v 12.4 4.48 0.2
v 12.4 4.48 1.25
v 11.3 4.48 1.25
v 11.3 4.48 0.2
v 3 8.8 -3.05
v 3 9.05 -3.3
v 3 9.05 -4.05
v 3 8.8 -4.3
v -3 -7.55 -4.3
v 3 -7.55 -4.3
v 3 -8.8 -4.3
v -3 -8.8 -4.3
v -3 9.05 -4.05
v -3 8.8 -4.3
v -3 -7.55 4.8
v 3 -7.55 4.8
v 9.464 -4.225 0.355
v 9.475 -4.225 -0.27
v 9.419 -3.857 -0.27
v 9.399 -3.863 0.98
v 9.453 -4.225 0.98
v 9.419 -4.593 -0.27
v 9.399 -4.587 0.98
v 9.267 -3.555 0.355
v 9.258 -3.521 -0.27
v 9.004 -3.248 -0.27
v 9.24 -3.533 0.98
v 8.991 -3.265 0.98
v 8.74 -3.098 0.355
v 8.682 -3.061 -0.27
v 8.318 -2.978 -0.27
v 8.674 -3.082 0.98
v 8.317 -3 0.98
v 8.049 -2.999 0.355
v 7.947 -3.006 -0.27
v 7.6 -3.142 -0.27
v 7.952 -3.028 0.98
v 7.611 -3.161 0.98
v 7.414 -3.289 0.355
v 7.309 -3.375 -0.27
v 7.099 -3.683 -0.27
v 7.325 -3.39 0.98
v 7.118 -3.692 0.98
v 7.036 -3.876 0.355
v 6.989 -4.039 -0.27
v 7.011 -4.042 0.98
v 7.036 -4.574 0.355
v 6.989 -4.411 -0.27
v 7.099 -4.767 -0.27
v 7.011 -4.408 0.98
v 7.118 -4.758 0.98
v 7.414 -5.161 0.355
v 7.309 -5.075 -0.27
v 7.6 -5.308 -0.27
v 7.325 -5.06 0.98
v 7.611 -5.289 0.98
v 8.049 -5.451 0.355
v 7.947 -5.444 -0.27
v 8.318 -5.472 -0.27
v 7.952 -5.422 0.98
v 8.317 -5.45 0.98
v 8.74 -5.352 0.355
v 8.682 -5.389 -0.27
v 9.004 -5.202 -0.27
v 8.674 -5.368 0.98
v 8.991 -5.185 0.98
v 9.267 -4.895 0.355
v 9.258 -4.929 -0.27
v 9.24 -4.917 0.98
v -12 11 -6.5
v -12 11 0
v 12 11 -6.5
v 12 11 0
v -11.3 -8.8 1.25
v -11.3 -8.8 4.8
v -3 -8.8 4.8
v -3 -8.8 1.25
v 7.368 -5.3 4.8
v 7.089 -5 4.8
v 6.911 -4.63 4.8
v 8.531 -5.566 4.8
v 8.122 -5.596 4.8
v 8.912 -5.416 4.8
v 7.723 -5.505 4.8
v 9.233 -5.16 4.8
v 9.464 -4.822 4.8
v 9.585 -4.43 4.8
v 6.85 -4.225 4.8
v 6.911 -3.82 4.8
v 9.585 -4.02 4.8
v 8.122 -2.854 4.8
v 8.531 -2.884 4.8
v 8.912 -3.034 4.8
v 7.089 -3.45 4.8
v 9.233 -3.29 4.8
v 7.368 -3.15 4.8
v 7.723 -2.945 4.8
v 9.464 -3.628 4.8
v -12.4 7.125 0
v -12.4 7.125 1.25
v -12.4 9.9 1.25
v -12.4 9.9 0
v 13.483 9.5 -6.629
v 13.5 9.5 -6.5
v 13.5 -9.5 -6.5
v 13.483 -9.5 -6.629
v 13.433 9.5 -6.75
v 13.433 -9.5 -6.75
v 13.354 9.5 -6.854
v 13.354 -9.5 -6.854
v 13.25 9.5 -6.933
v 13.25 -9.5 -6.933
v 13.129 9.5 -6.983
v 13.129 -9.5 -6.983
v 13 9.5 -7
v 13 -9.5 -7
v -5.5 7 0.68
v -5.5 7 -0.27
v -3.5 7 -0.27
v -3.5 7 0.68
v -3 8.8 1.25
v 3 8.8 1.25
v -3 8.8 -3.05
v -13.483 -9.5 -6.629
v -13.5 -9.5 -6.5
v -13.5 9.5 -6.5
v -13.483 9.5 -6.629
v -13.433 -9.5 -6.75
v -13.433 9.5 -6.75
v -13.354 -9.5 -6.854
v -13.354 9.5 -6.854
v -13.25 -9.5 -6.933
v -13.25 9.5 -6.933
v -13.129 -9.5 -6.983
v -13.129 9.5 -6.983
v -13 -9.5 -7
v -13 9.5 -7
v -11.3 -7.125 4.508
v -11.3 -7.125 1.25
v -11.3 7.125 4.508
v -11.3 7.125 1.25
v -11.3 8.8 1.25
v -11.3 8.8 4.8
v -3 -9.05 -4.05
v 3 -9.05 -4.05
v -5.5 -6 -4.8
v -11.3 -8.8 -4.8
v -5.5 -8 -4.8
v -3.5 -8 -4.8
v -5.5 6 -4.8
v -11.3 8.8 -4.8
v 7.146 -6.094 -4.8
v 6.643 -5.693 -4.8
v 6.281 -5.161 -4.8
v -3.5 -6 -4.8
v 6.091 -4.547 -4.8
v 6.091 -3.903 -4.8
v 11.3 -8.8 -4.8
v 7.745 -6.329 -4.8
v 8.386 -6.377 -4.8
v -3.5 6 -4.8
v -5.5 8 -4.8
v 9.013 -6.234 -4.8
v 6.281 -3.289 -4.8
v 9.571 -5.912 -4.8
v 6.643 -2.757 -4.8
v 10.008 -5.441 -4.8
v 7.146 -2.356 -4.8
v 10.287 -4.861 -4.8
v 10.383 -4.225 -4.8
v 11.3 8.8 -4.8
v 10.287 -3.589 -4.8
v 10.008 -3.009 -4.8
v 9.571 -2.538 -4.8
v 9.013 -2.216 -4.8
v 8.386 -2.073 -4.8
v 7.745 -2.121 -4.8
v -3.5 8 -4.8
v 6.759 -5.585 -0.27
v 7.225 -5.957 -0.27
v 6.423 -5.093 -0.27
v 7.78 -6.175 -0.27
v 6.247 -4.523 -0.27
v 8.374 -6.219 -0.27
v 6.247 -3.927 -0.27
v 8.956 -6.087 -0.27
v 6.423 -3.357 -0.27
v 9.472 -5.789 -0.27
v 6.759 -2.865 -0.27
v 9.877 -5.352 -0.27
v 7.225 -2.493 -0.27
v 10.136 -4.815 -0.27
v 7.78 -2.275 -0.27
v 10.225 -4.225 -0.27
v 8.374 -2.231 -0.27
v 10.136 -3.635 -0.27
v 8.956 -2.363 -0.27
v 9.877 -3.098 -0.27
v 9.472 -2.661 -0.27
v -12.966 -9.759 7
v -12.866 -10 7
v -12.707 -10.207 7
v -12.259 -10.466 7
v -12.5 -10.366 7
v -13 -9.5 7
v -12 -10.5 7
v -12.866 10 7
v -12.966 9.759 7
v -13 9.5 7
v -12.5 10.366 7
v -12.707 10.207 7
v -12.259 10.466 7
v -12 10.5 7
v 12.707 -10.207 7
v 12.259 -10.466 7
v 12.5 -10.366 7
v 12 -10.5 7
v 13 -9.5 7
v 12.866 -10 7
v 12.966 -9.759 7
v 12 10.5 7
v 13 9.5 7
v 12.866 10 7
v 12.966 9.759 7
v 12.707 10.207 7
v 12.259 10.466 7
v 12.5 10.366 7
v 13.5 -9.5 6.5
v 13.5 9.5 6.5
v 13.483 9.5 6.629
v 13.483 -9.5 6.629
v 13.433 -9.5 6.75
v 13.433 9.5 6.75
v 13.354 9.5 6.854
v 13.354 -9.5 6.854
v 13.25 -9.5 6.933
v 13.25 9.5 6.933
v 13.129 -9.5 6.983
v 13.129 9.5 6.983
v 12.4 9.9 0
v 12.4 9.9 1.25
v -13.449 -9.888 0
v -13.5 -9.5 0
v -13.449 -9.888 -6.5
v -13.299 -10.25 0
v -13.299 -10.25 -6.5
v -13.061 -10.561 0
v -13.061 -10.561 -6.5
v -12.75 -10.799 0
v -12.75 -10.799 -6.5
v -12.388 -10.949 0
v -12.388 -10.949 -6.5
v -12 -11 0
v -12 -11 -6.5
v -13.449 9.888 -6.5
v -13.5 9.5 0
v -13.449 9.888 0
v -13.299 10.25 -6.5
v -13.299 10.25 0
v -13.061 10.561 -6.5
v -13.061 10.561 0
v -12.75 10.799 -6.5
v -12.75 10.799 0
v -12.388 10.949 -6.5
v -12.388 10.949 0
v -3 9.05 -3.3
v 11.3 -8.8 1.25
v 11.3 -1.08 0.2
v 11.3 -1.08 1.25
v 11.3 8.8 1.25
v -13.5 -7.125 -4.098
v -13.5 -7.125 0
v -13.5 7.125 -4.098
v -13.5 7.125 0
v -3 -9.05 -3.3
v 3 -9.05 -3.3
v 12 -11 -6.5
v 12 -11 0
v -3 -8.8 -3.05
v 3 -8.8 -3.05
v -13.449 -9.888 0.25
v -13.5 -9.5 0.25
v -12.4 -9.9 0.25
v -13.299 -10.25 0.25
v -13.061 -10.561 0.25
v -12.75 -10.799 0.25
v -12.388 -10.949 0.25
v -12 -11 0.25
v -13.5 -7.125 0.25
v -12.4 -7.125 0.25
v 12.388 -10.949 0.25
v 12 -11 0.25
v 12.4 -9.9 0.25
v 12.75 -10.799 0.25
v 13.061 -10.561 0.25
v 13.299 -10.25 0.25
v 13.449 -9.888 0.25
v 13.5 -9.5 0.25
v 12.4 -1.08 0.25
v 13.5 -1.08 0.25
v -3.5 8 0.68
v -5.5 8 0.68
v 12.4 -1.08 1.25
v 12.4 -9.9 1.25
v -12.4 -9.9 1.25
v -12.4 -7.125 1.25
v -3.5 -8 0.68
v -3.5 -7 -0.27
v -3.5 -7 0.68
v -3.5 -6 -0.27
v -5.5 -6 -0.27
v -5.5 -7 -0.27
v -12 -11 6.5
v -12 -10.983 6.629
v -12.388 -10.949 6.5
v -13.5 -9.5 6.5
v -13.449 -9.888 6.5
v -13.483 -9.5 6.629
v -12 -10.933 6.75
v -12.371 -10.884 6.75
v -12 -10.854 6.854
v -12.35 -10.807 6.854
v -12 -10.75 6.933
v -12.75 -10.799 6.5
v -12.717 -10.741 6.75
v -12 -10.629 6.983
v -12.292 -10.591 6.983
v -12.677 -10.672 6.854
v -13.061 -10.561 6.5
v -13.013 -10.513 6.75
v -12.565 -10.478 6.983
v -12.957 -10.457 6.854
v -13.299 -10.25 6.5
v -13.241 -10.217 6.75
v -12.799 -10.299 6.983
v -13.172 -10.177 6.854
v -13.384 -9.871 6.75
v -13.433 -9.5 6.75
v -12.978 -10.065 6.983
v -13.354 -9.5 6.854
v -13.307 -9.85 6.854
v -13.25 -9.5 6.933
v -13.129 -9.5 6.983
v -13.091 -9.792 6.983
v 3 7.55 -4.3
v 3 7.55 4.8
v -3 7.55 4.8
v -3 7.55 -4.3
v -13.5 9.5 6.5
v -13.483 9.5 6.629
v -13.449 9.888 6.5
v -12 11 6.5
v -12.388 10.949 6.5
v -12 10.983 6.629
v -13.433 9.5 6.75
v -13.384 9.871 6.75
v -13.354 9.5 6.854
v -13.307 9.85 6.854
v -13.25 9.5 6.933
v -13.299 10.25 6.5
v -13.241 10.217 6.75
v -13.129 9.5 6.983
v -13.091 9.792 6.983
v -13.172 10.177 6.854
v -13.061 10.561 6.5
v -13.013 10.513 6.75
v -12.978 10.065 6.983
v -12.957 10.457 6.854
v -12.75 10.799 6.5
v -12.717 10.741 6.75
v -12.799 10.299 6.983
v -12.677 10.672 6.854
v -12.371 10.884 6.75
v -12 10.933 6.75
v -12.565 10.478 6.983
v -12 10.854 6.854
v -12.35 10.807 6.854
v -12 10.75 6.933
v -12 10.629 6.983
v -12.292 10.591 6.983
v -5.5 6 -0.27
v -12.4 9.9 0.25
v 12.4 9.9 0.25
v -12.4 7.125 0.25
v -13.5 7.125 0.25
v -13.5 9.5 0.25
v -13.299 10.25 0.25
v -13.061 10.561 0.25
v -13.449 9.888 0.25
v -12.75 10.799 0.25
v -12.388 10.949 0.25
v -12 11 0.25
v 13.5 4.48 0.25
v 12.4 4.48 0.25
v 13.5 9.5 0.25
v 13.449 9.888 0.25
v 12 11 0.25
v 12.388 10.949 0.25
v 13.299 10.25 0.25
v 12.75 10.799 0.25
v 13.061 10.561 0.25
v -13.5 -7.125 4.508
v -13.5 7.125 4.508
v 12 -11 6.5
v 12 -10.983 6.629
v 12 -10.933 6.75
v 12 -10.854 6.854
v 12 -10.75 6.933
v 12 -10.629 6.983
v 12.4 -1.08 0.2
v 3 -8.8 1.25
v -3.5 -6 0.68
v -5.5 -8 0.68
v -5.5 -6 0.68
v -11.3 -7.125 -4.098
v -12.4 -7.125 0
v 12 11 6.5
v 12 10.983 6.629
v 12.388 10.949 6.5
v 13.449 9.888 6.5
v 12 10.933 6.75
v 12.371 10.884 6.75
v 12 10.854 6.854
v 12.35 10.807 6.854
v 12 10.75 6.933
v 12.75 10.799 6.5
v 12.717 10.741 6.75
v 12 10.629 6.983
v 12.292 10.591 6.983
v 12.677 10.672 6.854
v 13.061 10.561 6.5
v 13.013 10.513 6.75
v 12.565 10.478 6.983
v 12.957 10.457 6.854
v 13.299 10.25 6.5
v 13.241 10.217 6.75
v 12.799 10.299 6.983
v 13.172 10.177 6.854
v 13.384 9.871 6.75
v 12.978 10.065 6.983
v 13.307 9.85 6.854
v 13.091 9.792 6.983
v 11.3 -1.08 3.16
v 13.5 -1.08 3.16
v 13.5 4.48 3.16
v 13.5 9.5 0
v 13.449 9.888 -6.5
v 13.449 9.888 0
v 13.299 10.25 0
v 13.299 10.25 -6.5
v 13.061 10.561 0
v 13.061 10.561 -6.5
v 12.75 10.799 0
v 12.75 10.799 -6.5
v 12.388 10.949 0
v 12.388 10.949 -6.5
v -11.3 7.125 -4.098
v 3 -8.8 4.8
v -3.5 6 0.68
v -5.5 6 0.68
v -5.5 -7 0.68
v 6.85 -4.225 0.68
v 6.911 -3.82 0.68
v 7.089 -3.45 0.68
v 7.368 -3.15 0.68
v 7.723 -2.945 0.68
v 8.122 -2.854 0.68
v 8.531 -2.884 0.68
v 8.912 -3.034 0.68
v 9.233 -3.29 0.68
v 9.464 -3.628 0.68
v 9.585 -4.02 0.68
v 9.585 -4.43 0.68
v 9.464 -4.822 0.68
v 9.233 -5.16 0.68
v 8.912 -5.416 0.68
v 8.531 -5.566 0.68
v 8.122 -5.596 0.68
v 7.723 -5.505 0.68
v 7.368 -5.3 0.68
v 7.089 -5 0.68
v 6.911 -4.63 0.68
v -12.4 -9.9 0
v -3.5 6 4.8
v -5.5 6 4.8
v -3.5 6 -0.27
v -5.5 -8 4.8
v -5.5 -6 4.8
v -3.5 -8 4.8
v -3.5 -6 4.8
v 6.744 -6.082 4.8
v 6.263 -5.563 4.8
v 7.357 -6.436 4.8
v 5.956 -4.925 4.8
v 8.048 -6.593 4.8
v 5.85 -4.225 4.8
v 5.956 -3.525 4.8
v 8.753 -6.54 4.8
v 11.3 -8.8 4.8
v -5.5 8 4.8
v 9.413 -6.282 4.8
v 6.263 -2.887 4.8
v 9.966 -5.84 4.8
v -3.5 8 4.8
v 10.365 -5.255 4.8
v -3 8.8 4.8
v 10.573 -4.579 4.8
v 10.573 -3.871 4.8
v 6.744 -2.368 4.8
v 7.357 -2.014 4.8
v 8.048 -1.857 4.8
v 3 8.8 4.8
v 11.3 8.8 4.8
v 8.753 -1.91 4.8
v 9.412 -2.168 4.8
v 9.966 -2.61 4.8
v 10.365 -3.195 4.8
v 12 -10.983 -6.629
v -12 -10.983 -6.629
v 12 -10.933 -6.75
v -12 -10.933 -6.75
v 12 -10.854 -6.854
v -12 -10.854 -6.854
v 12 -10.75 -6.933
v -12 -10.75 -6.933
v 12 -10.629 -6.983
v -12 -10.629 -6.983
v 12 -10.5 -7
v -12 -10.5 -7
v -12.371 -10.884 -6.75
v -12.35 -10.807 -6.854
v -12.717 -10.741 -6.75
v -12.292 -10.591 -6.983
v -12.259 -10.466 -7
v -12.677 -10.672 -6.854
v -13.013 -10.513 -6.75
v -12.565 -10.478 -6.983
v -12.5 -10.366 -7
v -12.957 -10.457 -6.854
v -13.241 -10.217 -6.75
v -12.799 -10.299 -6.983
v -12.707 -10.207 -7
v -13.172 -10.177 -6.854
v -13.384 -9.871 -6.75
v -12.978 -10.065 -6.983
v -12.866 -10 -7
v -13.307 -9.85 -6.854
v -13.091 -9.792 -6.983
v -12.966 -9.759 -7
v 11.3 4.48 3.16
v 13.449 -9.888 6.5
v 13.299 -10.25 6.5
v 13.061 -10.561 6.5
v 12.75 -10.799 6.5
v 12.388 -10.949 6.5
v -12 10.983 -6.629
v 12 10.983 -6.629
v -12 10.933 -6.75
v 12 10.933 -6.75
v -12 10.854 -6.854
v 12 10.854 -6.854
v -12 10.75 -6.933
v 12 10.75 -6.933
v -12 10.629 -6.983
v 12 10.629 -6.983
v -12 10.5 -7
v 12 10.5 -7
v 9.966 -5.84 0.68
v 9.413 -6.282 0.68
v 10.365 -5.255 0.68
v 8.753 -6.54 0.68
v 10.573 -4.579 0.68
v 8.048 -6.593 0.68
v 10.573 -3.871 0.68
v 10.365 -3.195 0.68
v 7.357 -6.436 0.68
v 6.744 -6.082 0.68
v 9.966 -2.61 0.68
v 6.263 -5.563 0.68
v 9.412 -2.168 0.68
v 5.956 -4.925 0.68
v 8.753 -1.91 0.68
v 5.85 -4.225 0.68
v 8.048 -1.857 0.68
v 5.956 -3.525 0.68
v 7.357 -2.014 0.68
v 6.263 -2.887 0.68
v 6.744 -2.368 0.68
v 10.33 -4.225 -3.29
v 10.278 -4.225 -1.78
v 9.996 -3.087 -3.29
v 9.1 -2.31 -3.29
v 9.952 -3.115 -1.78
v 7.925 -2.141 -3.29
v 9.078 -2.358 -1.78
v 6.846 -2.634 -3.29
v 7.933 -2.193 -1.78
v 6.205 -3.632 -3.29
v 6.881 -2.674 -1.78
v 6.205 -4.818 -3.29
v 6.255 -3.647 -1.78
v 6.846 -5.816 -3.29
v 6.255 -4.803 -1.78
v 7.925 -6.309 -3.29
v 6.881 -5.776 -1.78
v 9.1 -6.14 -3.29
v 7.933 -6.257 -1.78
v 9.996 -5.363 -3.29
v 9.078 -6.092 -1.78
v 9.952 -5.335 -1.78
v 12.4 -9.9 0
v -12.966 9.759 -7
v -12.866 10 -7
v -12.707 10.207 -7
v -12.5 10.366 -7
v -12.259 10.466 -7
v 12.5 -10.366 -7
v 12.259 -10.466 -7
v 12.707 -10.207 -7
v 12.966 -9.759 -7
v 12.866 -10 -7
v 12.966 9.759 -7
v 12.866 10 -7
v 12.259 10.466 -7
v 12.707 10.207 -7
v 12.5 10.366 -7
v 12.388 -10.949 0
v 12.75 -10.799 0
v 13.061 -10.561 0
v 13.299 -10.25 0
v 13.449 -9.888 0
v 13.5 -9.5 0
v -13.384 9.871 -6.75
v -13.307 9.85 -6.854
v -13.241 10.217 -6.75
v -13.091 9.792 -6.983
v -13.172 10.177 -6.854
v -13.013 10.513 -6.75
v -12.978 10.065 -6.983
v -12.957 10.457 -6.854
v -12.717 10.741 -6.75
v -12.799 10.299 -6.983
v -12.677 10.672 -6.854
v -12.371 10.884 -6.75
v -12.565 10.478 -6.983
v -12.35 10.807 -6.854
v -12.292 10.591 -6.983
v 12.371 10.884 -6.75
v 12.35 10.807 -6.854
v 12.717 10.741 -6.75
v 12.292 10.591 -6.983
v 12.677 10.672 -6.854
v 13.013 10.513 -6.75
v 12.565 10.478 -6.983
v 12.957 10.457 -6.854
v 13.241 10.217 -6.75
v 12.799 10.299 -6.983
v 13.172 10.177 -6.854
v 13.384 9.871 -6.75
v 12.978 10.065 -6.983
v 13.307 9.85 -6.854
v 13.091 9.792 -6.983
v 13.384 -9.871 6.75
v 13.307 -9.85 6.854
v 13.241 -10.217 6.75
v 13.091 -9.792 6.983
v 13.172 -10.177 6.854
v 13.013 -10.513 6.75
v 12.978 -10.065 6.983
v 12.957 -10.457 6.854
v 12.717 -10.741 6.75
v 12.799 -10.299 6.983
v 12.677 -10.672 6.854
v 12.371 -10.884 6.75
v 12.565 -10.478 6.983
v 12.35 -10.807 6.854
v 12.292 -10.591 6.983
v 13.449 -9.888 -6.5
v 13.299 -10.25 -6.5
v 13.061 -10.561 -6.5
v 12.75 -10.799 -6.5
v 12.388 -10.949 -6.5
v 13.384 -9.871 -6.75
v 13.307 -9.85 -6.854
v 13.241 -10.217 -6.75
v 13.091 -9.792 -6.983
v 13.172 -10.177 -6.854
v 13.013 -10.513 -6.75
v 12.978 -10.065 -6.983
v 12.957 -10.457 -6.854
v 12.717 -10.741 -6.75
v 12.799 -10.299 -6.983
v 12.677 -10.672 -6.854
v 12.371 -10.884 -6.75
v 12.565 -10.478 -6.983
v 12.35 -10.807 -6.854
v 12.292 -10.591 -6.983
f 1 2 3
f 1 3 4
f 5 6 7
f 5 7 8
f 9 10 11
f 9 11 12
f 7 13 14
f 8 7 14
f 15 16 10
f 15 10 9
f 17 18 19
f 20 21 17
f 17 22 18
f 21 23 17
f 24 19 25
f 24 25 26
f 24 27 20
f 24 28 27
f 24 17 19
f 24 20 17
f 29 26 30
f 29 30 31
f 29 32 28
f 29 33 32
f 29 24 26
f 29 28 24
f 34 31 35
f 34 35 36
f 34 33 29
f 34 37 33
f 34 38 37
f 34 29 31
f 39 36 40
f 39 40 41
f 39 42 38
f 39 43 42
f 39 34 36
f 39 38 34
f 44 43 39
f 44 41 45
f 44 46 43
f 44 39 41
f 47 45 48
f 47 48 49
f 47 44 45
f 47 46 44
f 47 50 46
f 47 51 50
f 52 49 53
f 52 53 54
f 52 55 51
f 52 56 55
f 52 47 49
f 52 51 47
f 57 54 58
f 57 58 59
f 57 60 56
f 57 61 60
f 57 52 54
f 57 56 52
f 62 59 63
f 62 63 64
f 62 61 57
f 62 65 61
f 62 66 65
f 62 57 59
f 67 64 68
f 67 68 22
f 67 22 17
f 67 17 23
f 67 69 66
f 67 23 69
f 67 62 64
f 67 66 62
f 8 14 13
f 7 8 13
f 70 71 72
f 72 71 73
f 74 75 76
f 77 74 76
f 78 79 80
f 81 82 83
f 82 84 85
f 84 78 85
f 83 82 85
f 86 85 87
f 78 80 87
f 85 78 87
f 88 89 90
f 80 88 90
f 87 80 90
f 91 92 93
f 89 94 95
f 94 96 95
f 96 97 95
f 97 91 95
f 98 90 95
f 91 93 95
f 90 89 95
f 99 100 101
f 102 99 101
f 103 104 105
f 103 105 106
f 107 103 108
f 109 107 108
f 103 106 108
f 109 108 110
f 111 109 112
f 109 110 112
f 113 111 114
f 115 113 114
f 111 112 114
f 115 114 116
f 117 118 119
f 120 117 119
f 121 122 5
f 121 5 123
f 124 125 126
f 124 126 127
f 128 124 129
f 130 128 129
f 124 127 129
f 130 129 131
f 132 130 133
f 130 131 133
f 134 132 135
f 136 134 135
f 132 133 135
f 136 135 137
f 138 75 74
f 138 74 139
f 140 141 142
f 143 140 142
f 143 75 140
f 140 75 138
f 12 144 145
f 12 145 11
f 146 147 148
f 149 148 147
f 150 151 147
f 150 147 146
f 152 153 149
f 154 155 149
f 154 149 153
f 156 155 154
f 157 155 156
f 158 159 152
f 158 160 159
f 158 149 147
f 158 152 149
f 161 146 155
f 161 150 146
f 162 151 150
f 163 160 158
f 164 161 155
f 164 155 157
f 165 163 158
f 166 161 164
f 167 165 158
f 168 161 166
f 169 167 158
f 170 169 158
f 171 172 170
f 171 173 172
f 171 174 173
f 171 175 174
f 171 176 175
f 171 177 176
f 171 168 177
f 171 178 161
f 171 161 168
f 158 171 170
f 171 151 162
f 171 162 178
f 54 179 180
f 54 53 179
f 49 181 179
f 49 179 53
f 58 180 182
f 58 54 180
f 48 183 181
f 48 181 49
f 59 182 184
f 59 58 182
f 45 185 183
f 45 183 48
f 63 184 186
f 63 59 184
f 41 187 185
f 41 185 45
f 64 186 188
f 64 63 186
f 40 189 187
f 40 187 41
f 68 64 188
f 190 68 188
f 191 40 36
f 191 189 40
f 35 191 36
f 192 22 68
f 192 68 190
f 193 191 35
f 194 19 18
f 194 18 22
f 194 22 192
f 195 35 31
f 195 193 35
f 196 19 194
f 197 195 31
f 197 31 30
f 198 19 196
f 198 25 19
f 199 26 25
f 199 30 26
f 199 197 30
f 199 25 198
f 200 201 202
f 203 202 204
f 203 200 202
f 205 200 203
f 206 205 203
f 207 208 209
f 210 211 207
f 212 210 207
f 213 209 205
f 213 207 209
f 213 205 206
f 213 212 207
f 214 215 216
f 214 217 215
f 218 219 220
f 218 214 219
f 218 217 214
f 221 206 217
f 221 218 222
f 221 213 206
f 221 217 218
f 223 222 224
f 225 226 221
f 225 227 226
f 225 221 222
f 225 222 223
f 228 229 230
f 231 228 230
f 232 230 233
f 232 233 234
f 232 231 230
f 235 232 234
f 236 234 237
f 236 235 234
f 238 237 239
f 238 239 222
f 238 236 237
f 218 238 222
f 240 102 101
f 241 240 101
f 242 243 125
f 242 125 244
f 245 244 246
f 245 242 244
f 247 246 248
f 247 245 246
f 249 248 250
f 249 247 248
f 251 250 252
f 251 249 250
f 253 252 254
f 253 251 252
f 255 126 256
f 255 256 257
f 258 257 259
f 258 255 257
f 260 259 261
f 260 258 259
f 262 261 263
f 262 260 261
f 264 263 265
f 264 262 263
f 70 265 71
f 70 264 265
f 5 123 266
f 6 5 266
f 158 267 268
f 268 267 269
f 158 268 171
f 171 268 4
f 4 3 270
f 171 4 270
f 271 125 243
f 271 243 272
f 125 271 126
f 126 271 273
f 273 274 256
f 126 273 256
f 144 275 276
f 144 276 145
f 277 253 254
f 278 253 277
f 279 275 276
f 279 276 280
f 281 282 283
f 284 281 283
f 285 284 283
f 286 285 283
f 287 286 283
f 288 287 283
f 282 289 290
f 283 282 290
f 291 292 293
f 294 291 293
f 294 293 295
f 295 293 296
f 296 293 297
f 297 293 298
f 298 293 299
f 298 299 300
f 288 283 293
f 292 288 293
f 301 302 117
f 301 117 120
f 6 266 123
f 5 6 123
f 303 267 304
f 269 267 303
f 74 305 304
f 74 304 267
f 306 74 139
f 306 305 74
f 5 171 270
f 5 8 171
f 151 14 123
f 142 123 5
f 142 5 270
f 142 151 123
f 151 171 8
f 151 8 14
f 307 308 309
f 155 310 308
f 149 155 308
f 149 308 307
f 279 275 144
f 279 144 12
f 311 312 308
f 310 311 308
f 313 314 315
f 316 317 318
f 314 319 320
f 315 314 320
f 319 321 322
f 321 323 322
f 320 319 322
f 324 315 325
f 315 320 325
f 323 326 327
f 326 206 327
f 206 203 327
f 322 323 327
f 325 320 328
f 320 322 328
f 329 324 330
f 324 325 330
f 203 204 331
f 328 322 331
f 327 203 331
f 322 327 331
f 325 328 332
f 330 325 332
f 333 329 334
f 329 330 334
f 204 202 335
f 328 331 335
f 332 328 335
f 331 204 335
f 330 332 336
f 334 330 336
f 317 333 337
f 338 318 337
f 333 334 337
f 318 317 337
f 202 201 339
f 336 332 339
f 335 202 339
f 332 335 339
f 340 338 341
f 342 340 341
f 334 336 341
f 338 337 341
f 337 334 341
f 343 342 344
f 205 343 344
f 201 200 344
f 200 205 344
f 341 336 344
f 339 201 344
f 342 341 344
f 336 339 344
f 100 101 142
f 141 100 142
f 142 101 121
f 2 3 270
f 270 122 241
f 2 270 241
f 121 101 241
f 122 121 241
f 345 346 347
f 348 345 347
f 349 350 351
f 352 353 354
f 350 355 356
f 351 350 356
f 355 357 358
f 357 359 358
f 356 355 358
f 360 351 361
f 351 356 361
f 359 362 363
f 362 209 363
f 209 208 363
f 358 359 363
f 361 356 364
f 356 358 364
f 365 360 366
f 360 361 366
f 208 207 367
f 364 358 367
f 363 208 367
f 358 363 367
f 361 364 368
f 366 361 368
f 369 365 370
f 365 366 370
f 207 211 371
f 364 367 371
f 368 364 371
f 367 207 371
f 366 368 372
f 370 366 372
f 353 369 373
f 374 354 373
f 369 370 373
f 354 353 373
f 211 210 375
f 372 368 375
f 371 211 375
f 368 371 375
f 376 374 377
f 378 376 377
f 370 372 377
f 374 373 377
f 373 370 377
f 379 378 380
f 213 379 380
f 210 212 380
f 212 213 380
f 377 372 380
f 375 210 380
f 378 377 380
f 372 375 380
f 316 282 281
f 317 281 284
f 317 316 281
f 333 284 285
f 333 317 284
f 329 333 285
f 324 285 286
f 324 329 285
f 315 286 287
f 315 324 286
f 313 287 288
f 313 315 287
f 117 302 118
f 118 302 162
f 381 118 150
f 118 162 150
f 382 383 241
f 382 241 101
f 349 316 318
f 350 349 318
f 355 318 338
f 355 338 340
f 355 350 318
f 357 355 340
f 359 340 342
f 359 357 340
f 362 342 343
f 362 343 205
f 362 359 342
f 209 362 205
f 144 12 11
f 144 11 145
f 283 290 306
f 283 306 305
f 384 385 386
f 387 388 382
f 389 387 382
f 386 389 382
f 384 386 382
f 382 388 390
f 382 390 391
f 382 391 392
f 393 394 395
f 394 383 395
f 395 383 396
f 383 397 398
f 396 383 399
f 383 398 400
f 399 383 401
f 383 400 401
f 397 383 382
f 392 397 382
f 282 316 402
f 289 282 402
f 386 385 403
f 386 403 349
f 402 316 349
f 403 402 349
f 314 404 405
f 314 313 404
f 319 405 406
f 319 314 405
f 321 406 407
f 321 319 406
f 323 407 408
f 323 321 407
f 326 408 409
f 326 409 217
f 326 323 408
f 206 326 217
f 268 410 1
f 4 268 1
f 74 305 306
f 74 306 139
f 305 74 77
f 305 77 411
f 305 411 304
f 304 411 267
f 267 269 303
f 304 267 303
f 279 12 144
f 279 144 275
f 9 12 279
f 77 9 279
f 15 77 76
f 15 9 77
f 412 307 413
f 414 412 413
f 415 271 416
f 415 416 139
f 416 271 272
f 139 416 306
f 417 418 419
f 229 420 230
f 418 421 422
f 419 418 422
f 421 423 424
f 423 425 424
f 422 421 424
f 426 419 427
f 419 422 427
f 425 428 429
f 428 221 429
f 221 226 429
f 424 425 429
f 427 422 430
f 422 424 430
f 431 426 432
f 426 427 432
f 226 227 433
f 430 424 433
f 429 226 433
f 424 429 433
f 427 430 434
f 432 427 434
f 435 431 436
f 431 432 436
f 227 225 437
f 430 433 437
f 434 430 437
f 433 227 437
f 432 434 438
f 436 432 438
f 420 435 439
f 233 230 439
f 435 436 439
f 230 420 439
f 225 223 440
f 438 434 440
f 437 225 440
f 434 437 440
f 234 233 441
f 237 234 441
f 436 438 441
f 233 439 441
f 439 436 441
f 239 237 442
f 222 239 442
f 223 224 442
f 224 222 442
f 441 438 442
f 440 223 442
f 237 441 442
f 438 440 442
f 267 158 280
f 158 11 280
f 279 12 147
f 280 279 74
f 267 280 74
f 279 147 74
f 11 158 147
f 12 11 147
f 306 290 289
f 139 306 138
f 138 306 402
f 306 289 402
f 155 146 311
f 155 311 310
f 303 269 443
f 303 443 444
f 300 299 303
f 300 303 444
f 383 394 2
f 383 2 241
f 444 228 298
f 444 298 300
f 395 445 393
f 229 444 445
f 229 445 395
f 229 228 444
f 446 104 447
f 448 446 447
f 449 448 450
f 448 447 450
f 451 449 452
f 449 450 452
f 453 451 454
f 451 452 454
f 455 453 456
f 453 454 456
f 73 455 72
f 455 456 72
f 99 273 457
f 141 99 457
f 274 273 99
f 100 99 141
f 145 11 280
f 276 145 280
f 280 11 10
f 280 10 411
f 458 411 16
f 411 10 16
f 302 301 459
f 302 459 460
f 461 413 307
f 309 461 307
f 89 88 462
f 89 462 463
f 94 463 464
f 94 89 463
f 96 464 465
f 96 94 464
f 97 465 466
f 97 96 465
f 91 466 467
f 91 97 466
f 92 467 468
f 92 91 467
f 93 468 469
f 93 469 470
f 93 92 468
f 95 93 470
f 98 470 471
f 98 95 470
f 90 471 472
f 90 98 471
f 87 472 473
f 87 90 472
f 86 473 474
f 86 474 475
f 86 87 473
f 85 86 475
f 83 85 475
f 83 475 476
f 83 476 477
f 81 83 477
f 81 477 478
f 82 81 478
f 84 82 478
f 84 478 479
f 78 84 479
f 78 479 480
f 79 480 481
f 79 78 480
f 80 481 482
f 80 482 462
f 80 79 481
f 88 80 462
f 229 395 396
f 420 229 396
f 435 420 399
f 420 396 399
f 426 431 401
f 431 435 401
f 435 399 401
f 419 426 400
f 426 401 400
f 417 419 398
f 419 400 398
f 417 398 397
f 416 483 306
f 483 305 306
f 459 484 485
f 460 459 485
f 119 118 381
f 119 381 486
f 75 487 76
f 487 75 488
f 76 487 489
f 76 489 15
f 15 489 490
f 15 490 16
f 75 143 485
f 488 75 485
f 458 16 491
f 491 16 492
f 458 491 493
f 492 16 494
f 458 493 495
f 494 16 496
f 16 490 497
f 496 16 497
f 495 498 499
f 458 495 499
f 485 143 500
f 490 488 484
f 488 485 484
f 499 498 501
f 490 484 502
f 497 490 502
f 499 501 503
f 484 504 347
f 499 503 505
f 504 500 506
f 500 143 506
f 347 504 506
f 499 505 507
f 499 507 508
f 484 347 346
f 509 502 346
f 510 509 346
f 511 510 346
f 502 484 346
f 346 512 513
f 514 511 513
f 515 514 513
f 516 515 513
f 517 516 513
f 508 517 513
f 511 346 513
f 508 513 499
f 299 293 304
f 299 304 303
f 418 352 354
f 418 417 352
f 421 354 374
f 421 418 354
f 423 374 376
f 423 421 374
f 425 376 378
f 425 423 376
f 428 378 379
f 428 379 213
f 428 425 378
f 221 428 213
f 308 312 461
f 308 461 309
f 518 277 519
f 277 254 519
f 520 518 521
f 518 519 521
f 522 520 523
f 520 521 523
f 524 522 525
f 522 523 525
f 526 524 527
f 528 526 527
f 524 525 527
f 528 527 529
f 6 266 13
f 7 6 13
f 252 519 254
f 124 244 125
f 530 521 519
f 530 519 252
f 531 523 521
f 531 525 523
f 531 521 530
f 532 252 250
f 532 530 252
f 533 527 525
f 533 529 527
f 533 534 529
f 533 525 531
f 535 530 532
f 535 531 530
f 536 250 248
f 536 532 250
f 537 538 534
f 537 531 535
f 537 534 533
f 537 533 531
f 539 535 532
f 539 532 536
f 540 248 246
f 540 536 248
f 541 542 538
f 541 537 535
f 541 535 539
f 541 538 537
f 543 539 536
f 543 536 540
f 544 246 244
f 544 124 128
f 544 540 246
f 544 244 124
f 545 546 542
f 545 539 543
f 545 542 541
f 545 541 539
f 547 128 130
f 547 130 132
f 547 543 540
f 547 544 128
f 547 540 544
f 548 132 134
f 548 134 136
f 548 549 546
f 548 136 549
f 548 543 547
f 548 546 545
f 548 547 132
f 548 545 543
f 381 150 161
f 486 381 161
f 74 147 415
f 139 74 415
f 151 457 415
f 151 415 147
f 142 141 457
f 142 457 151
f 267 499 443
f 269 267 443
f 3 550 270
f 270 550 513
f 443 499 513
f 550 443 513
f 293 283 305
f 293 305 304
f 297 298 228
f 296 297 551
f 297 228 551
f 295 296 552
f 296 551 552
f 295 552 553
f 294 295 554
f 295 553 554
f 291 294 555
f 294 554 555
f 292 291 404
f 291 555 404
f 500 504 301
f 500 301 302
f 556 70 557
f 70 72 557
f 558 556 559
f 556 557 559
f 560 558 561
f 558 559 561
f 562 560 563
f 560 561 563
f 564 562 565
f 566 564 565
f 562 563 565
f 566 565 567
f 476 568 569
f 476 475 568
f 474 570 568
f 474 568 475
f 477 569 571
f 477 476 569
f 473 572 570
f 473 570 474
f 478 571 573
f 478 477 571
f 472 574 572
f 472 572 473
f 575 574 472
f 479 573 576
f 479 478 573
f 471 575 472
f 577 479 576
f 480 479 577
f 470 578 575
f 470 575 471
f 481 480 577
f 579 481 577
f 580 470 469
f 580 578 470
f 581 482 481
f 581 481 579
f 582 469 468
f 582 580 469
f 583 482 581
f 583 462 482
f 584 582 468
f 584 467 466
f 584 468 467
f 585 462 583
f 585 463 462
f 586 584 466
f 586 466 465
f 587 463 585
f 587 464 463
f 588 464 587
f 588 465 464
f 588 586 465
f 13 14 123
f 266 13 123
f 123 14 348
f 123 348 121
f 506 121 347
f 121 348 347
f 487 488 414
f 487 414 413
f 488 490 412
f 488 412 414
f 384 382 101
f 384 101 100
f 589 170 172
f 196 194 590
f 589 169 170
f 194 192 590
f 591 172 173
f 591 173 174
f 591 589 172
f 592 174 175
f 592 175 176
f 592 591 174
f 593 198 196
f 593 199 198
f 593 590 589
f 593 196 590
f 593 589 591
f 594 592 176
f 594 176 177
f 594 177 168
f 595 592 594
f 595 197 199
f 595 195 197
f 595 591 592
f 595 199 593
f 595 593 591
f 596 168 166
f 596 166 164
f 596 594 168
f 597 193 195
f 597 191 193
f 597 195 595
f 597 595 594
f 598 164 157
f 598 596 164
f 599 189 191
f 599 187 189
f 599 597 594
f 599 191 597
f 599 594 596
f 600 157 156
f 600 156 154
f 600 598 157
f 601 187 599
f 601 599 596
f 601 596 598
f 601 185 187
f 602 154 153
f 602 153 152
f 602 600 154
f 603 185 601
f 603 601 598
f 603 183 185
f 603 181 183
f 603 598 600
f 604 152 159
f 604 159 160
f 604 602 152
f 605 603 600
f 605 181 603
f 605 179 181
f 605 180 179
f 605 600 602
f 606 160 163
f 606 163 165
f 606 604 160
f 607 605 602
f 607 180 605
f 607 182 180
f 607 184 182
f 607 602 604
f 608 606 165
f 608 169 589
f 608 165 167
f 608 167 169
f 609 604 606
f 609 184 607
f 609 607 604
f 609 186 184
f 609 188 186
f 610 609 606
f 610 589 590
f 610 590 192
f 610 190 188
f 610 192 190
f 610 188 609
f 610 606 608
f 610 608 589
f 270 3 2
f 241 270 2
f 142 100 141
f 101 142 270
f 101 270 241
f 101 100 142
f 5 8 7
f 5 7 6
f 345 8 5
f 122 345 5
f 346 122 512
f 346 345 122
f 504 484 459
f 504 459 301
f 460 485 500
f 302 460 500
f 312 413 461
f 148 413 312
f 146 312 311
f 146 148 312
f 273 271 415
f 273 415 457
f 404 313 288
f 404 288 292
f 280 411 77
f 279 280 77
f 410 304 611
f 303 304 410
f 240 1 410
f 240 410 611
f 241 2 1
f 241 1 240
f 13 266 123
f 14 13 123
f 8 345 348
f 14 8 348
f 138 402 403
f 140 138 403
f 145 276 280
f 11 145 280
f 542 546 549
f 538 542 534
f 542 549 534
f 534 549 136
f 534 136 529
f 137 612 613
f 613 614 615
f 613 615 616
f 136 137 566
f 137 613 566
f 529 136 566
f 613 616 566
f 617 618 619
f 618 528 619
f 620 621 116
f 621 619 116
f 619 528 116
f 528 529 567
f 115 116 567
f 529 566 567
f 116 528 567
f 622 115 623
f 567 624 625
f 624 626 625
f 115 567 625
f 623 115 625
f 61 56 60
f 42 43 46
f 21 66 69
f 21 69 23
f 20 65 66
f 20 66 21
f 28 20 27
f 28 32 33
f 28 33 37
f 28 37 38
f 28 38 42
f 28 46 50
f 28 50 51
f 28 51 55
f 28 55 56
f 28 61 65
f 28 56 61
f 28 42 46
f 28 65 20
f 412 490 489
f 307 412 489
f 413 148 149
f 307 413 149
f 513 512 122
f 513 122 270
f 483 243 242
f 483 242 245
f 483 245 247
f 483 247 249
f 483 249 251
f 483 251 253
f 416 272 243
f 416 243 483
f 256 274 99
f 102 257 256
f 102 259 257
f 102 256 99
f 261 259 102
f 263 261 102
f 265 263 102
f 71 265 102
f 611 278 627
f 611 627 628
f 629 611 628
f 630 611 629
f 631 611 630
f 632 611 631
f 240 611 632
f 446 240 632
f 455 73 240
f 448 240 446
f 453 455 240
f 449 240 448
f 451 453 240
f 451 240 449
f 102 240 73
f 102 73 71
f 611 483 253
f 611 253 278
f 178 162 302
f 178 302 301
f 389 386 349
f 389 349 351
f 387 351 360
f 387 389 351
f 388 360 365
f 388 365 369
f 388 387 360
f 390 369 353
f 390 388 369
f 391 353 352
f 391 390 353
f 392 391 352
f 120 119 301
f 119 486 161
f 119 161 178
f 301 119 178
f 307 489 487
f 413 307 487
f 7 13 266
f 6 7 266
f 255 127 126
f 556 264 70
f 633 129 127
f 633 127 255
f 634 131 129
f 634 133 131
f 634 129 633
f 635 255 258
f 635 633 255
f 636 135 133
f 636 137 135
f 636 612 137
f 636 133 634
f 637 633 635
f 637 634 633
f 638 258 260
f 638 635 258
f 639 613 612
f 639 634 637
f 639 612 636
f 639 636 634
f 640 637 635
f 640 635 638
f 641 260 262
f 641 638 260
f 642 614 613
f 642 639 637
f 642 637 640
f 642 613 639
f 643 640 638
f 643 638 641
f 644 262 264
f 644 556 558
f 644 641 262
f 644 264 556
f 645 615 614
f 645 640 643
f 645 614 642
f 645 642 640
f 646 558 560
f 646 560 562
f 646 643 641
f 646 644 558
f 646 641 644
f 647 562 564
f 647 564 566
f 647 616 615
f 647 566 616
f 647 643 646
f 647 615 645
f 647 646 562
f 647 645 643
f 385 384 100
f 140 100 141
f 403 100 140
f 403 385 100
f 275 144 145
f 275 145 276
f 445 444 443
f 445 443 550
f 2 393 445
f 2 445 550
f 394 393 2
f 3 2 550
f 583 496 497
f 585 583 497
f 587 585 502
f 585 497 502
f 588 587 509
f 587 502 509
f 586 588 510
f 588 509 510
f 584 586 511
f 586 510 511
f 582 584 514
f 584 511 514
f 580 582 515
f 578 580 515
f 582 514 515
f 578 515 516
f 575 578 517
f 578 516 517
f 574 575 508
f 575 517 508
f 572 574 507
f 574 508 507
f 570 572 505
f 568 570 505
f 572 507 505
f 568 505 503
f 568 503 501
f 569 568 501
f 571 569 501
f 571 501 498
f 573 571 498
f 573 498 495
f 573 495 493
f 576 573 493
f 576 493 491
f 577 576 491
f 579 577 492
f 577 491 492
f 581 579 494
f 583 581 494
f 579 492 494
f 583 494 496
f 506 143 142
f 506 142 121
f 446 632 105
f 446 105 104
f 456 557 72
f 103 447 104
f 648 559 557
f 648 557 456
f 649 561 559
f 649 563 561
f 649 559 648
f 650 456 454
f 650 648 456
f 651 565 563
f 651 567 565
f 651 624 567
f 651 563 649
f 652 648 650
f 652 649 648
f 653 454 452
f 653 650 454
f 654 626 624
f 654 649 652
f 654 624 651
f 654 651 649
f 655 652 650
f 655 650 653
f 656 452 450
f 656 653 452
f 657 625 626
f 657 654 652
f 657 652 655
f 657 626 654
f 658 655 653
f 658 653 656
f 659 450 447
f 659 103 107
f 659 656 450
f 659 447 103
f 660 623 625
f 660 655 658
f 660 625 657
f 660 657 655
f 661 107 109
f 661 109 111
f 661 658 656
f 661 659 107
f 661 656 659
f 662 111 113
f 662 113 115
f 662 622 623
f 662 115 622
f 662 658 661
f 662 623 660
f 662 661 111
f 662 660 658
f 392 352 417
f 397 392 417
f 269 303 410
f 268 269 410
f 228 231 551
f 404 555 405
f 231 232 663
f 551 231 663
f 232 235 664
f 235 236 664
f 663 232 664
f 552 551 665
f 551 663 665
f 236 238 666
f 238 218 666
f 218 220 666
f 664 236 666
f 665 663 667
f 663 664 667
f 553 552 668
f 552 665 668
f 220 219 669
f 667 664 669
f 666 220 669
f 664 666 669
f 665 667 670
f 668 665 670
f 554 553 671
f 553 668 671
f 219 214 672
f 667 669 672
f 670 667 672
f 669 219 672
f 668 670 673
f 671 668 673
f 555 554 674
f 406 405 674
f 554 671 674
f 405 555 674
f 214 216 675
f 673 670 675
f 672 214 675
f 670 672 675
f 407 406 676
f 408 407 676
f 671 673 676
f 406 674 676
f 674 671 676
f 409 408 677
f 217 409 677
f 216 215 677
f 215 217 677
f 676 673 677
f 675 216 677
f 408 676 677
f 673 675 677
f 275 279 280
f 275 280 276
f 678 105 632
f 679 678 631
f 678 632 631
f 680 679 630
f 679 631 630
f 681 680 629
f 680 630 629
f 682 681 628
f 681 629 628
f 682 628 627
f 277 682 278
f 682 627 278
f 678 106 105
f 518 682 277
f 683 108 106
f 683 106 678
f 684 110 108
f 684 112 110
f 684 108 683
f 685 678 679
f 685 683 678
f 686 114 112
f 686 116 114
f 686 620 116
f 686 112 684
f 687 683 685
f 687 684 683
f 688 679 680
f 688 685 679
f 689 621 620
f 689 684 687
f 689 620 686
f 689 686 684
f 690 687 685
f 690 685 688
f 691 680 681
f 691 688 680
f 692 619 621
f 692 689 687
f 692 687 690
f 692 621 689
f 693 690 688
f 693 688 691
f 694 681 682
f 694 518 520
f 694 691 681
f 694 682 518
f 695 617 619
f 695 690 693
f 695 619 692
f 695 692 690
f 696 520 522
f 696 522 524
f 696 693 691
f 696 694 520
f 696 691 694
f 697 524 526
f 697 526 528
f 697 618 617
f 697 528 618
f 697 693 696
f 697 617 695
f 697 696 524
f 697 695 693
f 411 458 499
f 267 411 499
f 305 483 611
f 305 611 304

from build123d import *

# Parameters (mm, degrees)
SKETCH1_W                   = 27
SKETCH1_H                   = 22
BOSS_EXTRUDE1_DEPTH         = 7
FILLET1_R                   = 1.5
SHELL1_T                    = 2.2
SKETCH4_W                   = 8.606
SKETCH4_H                   = 14.25
CUT_EXTRUDE1_DEPTH          = 10
SKETCH3_W                   = 2.96
SKETCH3_H                   = 5.56
CUT_EXTRUDE2_DEPTH          = 10
FILLET2_R                   = 0.5
FILLET3_R                   = 0.5
SKETCH5_W                   = 2
SKETCH5_H                   = 1
BOSS_EXTRUDE2_DEPTH         = 4.53
SKETCH5_3_W                 = 2
SKETCH5_3_H                 = 1
BOSS_EXTRUDE3_DEPTH         = 5.48
SKETCH6_W                   = 2
SKETCH6_H                   = 2
BOSS_EXTRUDE4_DEPTH         = 4.12
LIP_GROOVE2_GROOVE_DEPTH    = 1.25
LIP_GROOVE2_GROOVE_2_DEPTH  = 0.25
LIP_GROOVE2_LIP_START       = -12.4
LIP_GROOVE2_LIP_OUTLINE_W   = 1.1
LIP_GROOVE2_LIP_OUTLINE_H   = 1.25
LIP_GROOVE2_LIP_DEPTH       = 24.8
LIP_GROOVE2_LIP_START_2     = 11.3
LIP_GROOVE2_LIP_2_OUTLINE_W = 17.6
LIP_GROOVE2_LIP_2_OUTLINE_H = 1.25
LIP_GROOVE2_LIP_2_DEPTH     = 1.1
LIP_GROOVE2_LIP_3_OUTLINE_W = 1.675
LIP_GROOVE2_LIP_3_OUTLINE_H = 1.25
LIP_GROOVE2_LIP_3_DEPTH     = 1.1
SKETCH11_W                  = 6
SKETCH11_H                  = 1.25
BOSS_EXTRUDE5_DEPTH         = 9.1
BOSS_EXTRUDE6_DEPTH         = 6
CUT_EXTRUDE3_START          = -3
CUT_EXTRUDE3_DEPTH          = 6
SKETCH3_3_W                 = 2.96
SKETCH3_3_H                 = 5.56
CUT_EXTRUDE4_DEPTH          = 10
SKETCH14_R                  = 2.375
SKETCH14_R_2                = 1.375
BOSS_EXTRUDE7_DEPTH         = 4.12


# Read off the part's stored shape, not the designer's step: Mounting Boss1, Lip&Groove2-Groove, Lip&Groove2-Lip, Cut-Extrude3
with BuildPart() as part:
    # Sketch1 → Boss-Extrude1 (new, symmetric)
    with BuildSketch(Plane.XY):
        Rectangle(SKETCH1_W, SKETCH1_H)
    extrude(amount=BOSS_EXTRUDE1_DEPTH, both=True)

    # Fillet1
    fillet1_edges = [part.edges().sort_by_distance(p)[0] for p in [
        (-13.5, 11, 0),
        (13.5, 11, 0),
        (13.5, -11, 0),
        (-13.5, -11, 0),
    ]]
    fillet(fillet1_edges, radius=FILLET1_R)

    # Shell1 (no face opened: a closed hollow body)
    add(offset(amount=-SHELL1_T, mode=Mode.PRIVATE), mode=Mode.SUBTRACT)


with BuildPart() as body_2:
    # Split1: the piece on the far side of the plane
    add(part.part)
    split(bisect_by=Plane.XY, keep=Keep.BOTTOM)

    # Mounting Boss1 outline → Mounting Boss1 (revolve)
    with BuildSketch(Plane(origin=(8.225, -4.225, 0), x_dir=(1, 0, 0), z_dir=(0, -1, 0))):
        Polygon((2, -0.27), (1.25, -0.27), (1.228181169, 0.98), (0, 0.98), (0, -4.8), (2.158191086, -4.8), align=None)
    revolve(axis=Axis((8.225, -4.225, 0), (0, 0, 1)))


with BuildPart() as part_1:
    add(part.part)

    # Split1
    split(bisect_by=Plane.XY, keep=Keep.TOP)


with BuildPart() as cut_extrude1_tool:
    # Sketch4 → Cut-Extrude1 (new body)
    with BuildSketch(Plane.ZY.offset(13.5)):
        with Locations((0.205, 0)):
            Rectangle(SKETCH4_W, SKETCH4_H)
    extrude(amount=-CUT_EXTRUDE1_DEPTH)


with BuildPart() as part_2:
    add(part_1.part)

    # Cut-Extrude1: cut by cut_extrude1_tool
    add(cut_extrude1_tool.part, mode=Mode.SUBTRACT)

    # Sketch3 → Cut-Extrude2 (cut)
    with BuildSketch(Plane(origin=(13.5, 0, 0), x_dir=(0, 0, -1), z_dir=(1, 0, 0))):
        with Locations((-1.68, 1.7)):
            Rectangle(SKETCH3_W, SKETCH3_H)
    extrude(amount=-CUT_EXTRUDE2_DEPTH, mode=Mode.SUBTRACT)

    # Fillet2
    fillet2_edges = [part_2.edges().sort_by_distance(p)[0] for p in [
        (-13.5, 0, 7),
        (0, 11, 7),
        (0, -11, 7),
        (13.5, 0, 7),
        (-13.060660172, -10.560660172, 7),
        (13.060660172, -10.560660172, 7),
        (13.060660172, 10.560660172, 7),
        (-13.060660172, 10.560660172, 7),
    ]]
    fillet(fillet2_edges, radius=FILLET2_R)

    # Sketch6 → Boss-Extrude4 (add)
    with BuildSketch(Plane(origin=(0, 0, 4.8), x_dir=(-1, 0, 0), z_dir=(0, 0, -1))):
        with Locations((4.5, 7)):
            Rectangle(SKETCH6_W, SKETCH6_H)
    boss_extrude4 = extrude(amount=BOSS_EXTRUDE4_DEPTH)

    # Mirror3: Boss-Extrude4 across plane
    add(boss_extrude4.mirror(Plane.ZX))

    # Lip&Groove2-Groove outline → Lip&Groove2-Groove (cut)
    with BuildSketch(Plane.XY):
        Polygon((-12.4, -9.9), (12.4, -9.9), (12.4, -1.08), (13.5, -1.08), (13.5, 4.48), (12.4, 4.48), (12.4, 9.9), (-12.4, 9.9), (-12.4, 7.125), (-11.3, 7.125), (-11.3, 8.8), (11.3, 8.8), (11.3, -8.8), (-11.3, -8.8), (-11.3, -7.125), (-12.4, -7.125), align=None)
    extrude(amount=LIP_GROOVE2_GROOVE_DEPTH, mode=Mode.SUBTRACT)

    # Lip_Groove2-Groove 2 outline → Lip_Groove2-Groove 2 (cut)
    with BuildSketch(Plane.XY):
        with BuildLine():
            Line((12.4, -1.08), (12.4, -9.9))
            Line((12.4, -9.9), (-12.4, -9.9))
            Line((-12.4, -9.9), (-12.4, -7.125))
            Line((-12.4, -7.125), (-13.5, -7.125))
            Line((-13.5, -7.125), (-13.5, -9.5))
            ThreePointArc((-13.5, -9.5), (-13.060660172, -10.560660172), (-12, -11))
            Line((-12, -11), (12, -11))
            ThreePointArc((12, -11), (13.060660172, -10.560660172), (13.5, -9.5))
            Line((13.5, -9.5), (13.5, -1.08))
            Line((13.5, -1.08), (12.4, -1.08))
        make_face()
        with BuildLine():
            Line((12.4, 4.48), (13.5, 4.48))
            Line((13.5, 4.48), (13.5, 9.5))
            ThreePointArc((13.5, 9.5), (13.060660172, 10.560660172), (12, 11))
            Line((12, 11), (-12, 11))
            ThreePointArc((-12, 11), (-13.060660172, 10.560660172), (-13.5, 9.5))
            Line((-13.5, 9.5), (-13.5, 7.125))
            Line((-13.5, 7.125), (-12.4, 7.125))
            Line((-12.4, 7.125), (-12.4, 9.9))
            Line((-12.4, 9.9), (12.4, 9.9))
            Line((12.4, 9.9), (12.4, 4.48))
        make_face()
    extrude(amount=LIP_GROOVE2_GROOVE_2_DEPTH, mode=Mode.SUBTRACT)

    # Sketch11 → Boss-Extrude5 (add)
    with BuildSketch(Plane(origin=(0, 0, 4.8), x_dir=(-1, 0, 0), z_dir=(0, 0, -1))):
        with Locations((0, -8.175)):
            Rectangle(SKETCH11_W, SKETCH11_H)
    boss_extrude5 = extrude(amount=BOSS_EXTRUDE5_DEPTH)

    # Sketch12 → Boss-Extrude6 (add)
    with BuildSketch(Plane.ZY.offset(3)):
        Polygon((-4.3, -8.8), (-4.05, -9.05), (-3.3, -9.05), (-3.05, -8.8), align=None)
    boss_extrude6 = extrude(amount=-BOSS_EXTRUDE6_DEPTH)

    # Mirror5: Boss-Extrude5, Boss-Extrude6 across plane
    add(boss_extrude5.mirror(Plane.ZX))
    add(boss_extrude6.mirror(Plane.ZX))

    # Sketch14 → Boss-Extrude7 (add)
    with BuildSketch(Plane(origin=(0, 0, 4.8), x_dir=(-1, 0, 0), z_dir=(0, 0, -1))):
        with Locations((-8.225, -4.225)):
            Circle(SKETCH14_R)
        with Locations((-8.225, -4.225)):
            Circle(SKETCH14_R_2, mode=Mode.SUBTRACT)
    extrude(amount=BOSS_EXTRUDE7_DEPTH)


with BuildPart() as body_2_1:
    add(body_2.part)

    # Cut-Extrude1: cut by cut_extrude1_tool
    add(cut_extrude1_tool.part, mode=Mode.SUBTRACT)

    # Fillet3
    fillet3_edges = [body_2_1.edges().sort_by_distance(p)[0] for p in [
        (-13.5, 0, -7),
        (0, -11, -7),
        (13.5, 0, -7),
        (0, 11, -7),
        (-13.060660172, -10.560660172, -7),
        (13.060660172, -10.560660172, -7),
        (13.060660172, 10.560660172, -7),
        (-13.060660172, 10.560660172, -7),
    ]]
    fillet(fillet3_edges, radius=FILLET3_R)

    # Sketch5 → Boss-Extrude2 (add)
    with BuildSketch(Plane.XY.offset(-4.8)):
        with Locations((-4.5, 7.5)):
            Rectangle(SKETCH5_W, SKETCH5_H)
        with Locations((-4.5, 6.5)):
            Rectangle(SKETCH5_W, SKETCH5_H)
    boss_extrude2 = extrude(amount=BOSS_EXTRUDE2_DEPTH)

    # Sketch5<3> → Boss-Extrude3 (add)
    with BuildSketch(Plane.XY.offset(-4.8)):
        with Locations((-4.5, 7.5)):
            Rectangle(SKETCH5_3_W, SKETCH5_3_H)
    boss_extrude3 = extrude(amount=BOSS_EXTRUDE3_DEPTH)

    # Mirror2: Boss-Extrude2, Boss-Extrude3 across plane
    add(boss_extrude2.mirror(Plane.ZX))
    add(boss_extrude3.mirror(Plane.ZX))

    # Lip&Groove2-Lip outline → Lip&Groove2-Lip (add)
    with BuildSketch(Plane.YZ.offset(LIP_GROOVE2_LIP_START)):
        with Locations((-9.35, 0.625)):
            Rectangle(LIP_GROOVE2_LIP_OUTLINE_W, LIP_GROOVE2_LIP_OUTLINE_H)
        with Locations((9.35, 0.625)):
            Rectangle(LIP_GROOVE2_LIP_OUTLINE_W, LIP_GROOVE2_LIP_OUTLINE_H)
    extrude(amount=LIP_GROOVE2_LIP_DEPTH)

    # Lip_Groove2-Lip 2 outline → Lip_Groove2-Lip 2 (add)
    with BuildSketch(Plane.YZ.offset(LIP_GROOVE2_LIP_START_2)):
        with Locations((0, 0.625)):
            Rectangle(LIP_GROOVE2_LIP_2_OUTLINE_W, LIP_GROOVE2_LIP_2_OUTLINE_H)
    extrude(amount=LIP_GROOVE2_LIP_2_DEPTH)

    # Lip_Groove2-Lip 3 outline → Lip_Groove2-Lip 3 (add)
    with BuildSketch(Plane.YZ.offset(LIP_GROOVE2_LIP_START)):
        with Locations((-7.9625, 0.625)):
            Rectangle(LIP_GROOVE2_LIP_3_OUTLINE_W, LIP_GROOVE2_LIP_3_OUTLINE_H)
        with Locations((7.9625, 0.625)):
            Rectangle(LIP_GROOVE2_LIP_3_OUTLINE_W, LIP_GROOVE2_LIP_3_OUTLINE_H)
    extrude(amount=LIP_GROOVE2_LIP_3_DEPTH)

    # Cut-Extrude3 outline → Cut-Extrude3 (cut)
    with BuildSketch(Plane.YZ.offset(CUT_EXTRUDE3_START)):
        Polygon((-9.05, -3.3), (-9.05, -4.05), (-8.8, -4.3), (-8.8, -3.05), align=None)
    cut_extrude3 = extrude(amount=CUT_EXTRUDE3_DEPTH, mode=Mode.SUBTRACT)

    # Mirror6: Cut-Extrude3 across plane
    add(cut_extrude3.mirror(Plane.ZX), mode=Mode.SUBTRACT)

    # Sketch3<3> → Cut-Extrude4 (cut)
    with BuildSketch(Plane(origin=(13.5, 0, 0), x_dir=(0, 0, -1), z_dir=(1, 0, 0))):
        with Locations((-1.68, 1.7)):
            Rectangle(SKETCH3_3_W, SKETCH3_3_H)
    extrude(amount=-CUT_EXTRUDE4_DEPTH, mode=Mode.SUBTRACT)


solid = Compound([part_2.part, body_2_1.part])
